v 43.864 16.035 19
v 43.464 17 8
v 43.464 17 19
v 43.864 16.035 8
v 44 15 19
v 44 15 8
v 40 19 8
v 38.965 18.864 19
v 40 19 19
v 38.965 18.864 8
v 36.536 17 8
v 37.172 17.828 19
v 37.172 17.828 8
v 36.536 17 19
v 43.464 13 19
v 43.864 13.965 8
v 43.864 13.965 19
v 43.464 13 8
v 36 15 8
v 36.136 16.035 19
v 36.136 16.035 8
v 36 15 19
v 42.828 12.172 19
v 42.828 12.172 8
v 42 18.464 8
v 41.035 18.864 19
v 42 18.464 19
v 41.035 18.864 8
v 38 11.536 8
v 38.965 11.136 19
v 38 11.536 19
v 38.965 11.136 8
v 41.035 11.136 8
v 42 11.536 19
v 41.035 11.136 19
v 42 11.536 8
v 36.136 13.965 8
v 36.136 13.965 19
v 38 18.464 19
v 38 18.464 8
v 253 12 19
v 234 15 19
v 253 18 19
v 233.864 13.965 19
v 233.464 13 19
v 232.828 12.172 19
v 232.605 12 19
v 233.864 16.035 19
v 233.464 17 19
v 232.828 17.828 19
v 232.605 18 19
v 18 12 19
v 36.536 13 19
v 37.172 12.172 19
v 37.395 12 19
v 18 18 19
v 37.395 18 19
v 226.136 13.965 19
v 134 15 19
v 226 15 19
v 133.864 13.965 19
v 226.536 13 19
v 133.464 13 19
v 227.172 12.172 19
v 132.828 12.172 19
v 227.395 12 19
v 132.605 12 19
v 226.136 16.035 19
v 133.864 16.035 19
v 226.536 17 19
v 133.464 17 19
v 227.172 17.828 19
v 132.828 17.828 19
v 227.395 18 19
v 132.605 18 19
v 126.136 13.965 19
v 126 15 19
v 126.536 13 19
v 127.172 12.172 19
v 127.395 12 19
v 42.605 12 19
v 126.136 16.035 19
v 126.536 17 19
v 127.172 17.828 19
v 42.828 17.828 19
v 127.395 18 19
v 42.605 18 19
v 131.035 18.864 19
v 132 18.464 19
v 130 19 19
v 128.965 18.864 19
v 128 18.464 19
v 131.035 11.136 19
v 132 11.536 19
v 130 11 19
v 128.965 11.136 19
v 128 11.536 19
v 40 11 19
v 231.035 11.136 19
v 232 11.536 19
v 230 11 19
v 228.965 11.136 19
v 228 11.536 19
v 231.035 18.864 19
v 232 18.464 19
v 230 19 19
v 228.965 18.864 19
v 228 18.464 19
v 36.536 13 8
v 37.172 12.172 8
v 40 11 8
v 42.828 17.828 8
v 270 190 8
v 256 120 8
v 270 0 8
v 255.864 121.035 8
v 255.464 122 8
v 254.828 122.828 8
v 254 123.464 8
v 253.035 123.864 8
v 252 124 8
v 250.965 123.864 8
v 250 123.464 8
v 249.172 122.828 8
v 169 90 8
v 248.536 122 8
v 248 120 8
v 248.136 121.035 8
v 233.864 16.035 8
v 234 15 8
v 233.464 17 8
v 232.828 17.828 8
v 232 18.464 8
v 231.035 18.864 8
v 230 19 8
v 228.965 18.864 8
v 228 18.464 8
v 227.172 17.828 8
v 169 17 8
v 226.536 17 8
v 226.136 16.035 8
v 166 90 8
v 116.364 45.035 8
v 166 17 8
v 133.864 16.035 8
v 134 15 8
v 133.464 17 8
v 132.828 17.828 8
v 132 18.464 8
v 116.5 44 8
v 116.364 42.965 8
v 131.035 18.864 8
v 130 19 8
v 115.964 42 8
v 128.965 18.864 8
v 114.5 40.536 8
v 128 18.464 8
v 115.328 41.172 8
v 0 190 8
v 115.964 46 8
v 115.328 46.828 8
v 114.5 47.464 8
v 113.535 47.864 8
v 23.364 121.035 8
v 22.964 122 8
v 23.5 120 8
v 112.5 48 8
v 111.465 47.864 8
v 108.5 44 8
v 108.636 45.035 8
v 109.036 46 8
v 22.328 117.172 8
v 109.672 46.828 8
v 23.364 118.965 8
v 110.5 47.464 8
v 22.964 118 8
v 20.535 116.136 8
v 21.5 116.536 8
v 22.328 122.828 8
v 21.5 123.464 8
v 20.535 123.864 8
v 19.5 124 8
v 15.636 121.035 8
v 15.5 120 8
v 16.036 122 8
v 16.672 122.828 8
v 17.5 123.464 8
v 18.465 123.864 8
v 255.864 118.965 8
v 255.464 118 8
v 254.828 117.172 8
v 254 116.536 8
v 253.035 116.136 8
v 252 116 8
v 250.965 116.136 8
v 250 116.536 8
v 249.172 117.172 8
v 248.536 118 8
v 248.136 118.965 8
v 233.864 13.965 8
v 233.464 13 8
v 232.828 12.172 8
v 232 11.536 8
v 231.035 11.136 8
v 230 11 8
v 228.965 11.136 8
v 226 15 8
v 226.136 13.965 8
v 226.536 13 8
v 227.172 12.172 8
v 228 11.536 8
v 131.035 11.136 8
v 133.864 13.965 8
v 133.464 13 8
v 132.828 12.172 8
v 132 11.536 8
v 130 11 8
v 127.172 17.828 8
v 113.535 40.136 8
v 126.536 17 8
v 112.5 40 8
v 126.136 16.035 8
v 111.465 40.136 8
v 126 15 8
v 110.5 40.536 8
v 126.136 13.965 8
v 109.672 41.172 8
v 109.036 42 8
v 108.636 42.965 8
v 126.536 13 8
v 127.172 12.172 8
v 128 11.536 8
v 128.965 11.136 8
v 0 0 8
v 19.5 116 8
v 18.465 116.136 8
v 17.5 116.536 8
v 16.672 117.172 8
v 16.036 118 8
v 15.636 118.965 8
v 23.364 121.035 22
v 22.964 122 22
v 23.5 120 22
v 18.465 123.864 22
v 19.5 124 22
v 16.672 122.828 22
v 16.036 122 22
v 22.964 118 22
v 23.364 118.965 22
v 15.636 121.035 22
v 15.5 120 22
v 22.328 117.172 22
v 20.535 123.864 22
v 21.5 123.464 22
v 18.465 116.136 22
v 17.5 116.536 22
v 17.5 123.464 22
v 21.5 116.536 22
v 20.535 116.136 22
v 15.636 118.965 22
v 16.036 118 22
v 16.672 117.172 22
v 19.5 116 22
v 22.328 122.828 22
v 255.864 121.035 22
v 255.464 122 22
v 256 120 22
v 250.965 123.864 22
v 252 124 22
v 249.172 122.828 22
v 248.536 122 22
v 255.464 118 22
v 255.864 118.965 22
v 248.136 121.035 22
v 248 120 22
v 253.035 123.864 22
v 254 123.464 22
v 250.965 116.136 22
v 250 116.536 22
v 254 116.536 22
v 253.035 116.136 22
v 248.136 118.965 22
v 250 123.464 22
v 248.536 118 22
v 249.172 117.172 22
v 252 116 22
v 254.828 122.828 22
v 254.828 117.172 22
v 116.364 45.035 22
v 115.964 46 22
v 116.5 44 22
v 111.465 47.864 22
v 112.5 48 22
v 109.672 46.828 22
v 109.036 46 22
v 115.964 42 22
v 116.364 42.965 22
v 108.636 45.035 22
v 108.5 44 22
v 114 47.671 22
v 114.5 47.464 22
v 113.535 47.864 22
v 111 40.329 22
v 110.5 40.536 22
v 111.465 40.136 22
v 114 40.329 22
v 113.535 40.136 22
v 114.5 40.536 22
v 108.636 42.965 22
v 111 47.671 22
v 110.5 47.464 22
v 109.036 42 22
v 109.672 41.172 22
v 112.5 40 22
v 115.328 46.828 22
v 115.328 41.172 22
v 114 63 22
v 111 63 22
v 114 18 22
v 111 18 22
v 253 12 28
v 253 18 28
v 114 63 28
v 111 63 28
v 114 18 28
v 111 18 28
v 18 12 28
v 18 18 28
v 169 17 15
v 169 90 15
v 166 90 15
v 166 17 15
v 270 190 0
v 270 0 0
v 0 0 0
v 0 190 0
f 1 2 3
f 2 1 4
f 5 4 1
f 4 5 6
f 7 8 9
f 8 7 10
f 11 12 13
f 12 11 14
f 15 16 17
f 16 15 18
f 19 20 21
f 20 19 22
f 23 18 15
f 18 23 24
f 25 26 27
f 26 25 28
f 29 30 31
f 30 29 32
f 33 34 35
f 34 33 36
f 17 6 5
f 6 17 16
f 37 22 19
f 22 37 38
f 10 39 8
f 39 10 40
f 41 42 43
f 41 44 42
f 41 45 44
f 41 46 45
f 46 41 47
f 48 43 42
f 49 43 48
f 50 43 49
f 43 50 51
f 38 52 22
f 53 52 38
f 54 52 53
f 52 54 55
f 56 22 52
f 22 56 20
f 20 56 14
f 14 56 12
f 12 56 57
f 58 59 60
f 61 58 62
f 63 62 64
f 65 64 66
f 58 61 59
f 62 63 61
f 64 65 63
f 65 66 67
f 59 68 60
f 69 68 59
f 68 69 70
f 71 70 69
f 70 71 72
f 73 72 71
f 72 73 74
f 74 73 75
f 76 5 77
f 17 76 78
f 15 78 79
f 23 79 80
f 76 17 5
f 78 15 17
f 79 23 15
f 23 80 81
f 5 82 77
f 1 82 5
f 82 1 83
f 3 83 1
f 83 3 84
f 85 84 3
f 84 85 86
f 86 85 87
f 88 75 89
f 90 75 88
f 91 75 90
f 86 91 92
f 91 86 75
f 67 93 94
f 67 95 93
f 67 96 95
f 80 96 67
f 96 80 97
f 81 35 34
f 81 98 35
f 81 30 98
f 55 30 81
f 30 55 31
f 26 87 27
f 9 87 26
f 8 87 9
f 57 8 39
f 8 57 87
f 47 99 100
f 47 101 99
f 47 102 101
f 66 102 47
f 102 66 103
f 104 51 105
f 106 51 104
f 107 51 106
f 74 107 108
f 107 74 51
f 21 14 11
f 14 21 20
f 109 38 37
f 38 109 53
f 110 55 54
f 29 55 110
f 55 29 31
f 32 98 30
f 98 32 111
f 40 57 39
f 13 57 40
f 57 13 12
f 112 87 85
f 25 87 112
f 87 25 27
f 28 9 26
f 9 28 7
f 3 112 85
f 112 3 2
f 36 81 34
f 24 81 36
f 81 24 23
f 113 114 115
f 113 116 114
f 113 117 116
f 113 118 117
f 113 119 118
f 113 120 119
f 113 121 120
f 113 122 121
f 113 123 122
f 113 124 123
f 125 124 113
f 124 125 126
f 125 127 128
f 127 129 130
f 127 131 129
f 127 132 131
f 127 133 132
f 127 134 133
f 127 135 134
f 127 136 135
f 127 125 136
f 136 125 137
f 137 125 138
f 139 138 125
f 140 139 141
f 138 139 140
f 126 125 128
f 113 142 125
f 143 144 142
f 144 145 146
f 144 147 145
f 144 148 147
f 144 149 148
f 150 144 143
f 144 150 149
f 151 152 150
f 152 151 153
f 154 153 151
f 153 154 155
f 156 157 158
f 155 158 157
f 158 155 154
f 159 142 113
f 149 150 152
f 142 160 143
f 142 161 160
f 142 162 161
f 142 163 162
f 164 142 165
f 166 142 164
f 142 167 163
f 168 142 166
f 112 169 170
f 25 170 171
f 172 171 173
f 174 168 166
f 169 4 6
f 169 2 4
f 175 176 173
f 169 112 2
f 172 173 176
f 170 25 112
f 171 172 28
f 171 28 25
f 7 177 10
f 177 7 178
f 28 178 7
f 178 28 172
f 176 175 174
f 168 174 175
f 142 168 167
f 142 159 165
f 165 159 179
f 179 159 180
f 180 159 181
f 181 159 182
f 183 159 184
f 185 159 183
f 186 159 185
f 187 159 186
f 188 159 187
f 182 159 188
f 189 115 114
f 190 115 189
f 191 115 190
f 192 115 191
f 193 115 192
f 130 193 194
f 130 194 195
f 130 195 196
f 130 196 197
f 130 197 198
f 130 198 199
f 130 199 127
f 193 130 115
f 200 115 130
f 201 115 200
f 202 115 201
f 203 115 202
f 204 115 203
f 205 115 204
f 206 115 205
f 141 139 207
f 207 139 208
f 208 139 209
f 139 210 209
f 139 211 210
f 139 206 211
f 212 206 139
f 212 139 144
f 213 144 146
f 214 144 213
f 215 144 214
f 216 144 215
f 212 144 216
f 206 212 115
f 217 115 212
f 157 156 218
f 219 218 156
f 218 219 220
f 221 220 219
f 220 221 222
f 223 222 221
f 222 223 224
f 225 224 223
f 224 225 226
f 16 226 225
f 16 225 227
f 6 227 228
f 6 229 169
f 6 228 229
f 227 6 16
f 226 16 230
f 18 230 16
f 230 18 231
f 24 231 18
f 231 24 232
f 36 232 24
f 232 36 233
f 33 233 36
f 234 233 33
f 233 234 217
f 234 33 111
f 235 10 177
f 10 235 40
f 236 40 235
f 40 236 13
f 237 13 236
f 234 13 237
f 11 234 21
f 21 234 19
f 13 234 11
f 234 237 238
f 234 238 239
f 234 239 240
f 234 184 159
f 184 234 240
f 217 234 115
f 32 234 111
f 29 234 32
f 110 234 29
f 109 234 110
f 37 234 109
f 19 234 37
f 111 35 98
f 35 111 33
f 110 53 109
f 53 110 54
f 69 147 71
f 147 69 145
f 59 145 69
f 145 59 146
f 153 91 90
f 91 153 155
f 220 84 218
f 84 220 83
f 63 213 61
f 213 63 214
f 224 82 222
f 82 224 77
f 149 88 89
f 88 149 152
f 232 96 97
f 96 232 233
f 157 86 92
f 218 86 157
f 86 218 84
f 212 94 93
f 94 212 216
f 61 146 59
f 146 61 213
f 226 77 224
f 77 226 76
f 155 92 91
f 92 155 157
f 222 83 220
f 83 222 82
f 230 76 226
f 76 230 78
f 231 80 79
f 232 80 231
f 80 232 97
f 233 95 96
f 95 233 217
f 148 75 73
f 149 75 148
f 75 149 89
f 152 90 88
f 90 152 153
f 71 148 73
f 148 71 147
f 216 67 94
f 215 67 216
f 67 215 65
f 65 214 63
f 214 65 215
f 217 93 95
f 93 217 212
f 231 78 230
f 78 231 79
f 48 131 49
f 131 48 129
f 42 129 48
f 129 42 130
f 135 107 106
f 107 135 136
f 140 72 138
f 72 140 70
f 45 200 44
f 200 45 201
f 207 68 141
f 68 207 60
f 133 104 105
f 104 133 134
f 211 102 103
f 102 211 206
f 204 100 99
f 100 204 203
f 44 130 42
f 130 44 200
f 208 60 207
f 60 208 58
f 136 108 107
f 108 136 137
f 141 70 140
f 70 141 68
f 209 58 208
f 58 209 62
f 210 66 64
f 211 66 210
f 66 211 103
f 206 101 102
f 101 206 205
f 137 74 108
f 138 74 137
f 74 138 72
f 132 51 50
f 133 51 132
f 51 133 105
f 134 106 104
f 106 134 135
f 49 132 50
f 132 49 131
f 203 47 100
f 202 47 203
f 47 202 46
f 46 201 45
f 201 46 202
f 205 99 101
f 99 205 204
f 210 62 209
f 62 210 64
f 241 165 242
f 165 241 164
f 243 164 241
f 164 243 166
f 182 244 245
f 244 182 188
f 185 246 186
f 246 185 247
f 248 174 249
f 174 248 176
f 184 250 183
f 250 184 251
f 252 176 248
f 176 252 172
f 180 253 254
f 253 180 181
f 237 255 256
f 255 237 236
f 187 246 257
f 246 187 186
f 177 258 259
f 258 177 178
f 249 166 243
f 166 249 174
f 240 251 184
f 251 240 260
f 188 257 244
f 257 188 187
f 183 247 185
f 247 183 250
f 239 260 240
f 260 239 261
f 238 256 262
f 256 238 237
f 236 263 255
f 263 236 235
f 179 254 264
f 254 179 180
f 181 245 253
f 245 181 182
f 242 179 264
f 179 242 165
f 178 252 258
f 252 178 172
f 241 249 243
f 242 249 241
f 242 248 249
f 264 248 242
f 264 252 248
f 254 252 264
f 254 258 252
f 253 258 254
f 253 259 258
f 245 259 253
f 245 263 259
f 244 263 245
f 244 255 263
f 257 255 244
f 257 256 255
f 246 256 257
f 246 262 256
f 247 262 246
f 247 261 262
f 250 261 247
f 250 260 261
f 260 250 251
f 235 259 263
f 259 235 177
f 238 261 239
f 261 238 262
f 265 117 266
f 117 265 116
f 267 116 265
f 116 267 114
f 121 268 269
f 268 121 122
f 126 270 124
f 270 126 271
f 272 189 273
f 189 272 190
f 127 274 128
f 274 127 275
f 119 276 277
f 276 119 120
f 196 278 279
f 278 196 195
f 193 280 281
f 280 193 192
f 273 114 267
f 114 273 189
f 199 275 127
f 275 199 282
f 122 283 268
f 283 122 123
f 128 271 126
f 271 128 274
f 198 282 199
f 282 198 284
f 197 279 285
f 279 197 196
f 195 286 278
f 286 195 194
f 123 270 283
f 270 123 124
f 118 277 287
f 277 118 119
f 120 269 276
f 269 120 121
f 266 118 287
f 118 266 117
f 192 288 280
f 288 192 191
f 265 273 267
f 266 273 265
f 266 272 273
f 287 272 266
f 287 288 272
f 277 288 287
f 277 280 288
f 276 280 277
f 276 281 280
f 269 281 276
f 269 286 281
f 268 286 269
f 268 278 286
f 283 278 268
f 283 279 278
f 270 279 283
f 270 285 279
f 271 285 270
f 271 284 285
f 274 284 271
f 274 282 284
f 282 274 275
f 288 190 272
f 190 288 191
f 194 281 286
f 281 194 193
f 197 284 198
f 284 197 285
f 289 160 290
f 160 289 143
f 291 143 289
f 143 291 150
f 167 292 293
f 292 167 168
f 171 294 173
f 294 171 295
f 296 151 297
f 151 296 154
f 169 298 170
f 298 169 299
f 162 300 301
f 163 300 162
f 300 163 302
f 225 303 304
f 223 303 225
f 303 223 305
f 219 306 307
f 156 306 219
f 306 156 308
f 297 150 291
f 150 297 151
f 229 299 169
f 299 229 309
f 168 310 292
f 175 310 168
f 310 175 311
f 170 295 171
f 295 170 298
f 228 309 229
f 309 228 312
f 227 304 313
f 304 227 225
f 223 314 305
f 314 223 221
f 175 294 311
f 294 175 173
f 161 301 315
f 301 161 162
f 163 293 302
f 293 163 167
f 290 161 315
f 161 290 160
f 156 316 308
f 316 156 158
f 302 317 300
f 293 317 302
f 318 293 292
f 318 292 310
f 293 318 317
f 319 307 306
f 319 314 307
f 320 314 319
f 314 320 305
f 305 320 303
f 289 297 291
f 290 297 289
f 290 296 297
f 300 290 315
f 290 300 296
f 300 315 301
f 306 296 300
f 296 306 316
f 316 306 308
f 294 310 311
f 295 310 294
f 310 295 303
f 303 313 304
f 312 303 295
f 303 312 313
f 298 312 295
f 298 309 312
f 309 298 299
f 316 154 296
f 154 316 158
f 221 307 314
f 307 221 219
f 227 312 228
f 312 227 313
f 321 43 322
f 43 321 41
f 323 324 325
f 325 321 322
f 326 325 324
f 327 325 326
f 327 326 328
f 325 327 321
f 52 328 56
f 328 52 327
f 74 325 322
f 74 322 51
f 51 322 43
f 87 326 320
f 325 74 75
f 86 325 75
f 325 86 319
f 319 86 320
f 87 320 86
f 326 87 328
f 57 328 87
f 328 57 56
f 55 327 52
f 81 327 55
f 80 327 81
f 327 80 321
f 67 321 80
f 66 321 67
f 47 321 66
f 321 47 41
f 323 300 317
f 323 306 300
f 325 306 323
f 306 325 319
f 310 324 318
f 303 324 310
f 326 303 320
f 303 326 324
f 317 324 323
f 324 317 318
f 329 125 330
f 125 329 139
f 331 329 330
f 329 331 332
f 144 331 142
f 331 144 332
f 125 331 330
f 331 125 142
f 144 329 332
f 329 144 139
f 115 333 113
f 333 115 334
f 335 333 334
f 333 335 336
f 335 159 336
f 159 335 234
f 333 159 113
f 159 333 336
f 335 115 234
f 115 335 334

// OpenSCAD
// Forest Guardian G5 real-source eight-datum external assembly fixture. NOT product/NOT CAM.
// Dimensions in mm; base relative Z=0 is original D7 source Z116.
$fn=24;
show_original_source_member_boxes=true;
module board(){color([.72,.58,.4,.5])cube([270,190,8]);}
module spacers(){
  color([.1,.45,.62]){
    translate([40,15,8])cylinder(r=4,h=11);
    translate([130,15,8])cylinder(r=4,h=11);
    translate([230,15,8])cylinder(r=4,h=11);
    translate([19.5,120,8])cylinder(r=4,h=14);
    translate([252,120,8])cylinder(r=4,h=14);
    translate([112.5,44,8])cylinder(r=4,h=14);
  }
}
// Two right underpass supports seat on the base directly at original D7 Z116.
// Product components are separate from jig and must NOT be fastened to it in service.
board();spacers();
if(show_original_source_member_boxes) {
  // Schematic only: selected five part bounding routes, source solids not fully rendered.
  color([.2,.27,.4,.65])translate([18,12,19])cube([235,6,9]);
  color([.2,.56,.44,.65])translate([111,17,22])cube([3,46,6]);
  color([.68,.32,.34,.65])translate([166,17,8])cube([3,73,7]);
}
